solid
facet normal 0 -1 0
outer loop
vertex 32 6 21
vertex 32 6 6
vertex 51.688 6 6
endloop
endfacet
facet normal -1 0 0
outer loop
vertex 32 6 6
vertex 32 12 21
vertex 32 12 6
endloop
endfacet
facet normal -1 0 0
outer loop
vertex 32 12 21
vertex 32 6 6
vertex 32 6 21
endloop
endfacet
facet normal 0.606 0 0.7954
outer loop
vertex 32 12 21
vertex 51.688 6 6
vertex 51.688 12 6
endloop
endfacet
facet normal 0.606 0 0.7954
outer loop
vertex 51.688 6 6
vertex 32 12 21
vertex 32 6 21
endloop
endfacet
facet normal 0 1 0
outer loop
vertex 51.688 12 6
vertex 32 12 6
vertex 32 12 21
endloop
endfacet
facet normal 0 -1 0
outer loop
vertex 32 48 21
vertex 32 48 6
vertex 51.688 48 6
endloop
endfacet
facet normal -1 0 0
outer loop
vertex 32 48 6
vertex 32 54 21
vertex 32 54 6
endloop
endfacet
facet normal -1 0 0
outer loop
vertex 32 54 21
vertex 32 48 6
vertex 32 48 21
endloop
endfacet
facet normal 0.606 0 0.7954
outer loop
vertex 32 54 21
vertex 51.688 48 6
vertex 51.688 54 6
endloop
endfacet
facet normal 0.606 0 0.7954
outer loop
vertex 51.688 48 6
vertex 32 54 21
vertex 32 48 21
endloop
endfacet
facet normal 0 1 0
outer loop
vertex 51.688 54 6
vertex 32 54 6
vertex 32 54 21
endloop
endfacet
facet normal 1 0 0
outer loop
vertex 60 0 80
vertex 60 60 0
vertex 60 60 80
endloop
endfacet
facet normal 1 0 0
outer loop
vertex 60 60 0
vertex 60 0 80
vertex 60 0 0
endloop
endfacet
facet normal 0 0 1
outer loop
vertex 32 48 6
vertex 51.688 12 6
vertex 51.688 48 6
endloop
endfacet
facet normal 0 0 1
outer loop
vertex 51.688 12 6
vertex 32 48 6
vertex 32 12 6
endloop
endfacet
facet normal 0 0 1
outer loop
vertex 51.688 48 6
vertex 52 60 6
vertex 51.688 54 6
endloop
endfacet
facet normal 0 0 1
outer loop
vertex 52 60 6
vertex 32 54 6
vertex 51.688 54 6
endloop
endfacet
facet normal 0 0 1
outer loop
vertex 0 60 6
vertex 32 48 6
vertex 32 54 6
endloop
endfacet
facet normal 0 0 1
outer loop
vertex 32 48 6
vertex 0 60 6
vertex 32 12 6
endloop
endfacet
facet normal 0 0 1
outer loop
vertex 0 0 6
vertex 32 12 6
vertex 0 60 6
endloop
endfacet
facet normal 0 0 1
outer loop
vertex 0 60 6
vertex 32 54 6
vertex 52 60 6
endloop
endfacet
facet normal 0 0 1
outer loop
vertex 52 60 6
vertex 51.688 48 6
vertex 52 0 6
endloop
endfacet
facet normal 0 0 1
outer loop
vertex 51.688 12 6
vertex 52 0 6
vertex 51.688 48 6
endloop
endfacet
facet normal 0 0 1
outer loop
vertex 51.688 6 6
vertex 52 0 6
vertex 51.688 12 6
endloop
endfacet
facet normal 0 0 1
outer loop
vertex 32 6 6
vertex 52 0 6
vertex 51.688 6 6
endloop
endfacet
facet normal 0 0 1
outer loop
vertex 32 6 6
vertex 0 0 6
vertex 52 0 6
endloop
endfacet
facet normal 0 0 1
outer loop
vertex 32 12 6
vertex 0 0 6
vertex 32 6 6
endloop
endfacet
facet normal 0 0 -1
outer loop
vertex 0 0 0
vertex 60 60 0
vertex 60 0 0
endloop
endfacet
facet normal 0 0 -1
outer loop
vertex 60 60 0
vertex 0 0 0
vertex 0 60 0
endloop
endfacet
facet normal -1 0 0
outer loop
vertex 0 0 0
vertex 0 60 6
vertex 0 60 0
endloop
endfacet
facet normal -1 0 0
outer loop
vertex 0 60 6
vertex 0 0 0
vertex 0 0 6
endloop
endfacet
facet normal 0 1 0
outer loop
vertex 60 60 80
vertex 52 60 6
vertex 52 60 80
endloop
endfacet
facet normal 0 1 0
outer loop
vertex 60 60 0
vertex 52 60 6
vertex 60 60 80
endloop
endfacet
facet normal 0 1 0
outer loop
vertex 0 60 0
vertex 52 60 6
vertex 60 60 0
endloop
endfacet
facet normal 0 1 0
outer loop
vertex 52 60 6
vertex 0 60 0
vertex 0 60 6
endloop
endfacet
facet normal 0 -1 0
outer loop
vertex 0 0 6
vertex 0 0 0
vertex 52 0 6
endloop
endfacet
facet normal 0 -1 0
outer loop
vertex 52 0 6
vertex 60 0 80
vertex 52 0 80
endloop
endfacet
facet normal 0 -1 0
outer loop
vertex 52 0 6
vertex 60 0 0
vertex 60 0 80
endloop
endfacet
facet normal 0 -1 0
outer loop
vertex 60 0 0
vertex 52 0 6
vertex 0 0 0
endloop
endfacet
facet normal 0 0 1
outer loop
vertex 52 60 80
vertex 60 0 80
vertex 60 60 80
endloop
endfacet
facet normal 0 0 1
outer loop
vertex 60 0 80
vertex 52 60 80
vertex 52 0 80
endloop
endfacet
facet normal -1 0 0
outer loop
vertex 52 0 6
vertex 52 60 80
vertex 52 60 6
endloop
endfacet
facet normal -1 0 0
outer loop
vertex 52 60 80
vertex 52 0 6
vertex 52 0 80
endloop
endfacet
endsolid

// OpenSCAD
$fn = 32;

// ----------------------------------------------------------------------
// Rib bracket: 2-gusset L bracket
// ----------------------------------------------------------------------

// --- parameters (mm) ---
base_l = 60;              // foot length, X
base_w = 60;              // foot width, Y
base_t = 6;               // foot thickness
plate_t = 8;              // upright plate thickness
plate_h = 80;             // overall height
gus_l = 20;               // gusset leg along the foot
gus_h = 16;               // gusset height
gus_t = 6;                // gusset thickness
gus_edge = 6;             // gusset margin from the foot edge
n_gus = 2;                // gusset count

gus_pitch = (base_w - 2 * gus_edge - gus_t) / (n_gus - 1);  // gusset pitch

union() {
  cube([base_l, base_w, base_t]);
  translate([base_l - plate_t, 0, base_t - 1])
    cube([plate_t, base_w, plate_h - base_t + 1]);
  for (i = [0 : n_gus - 1])
    translate([base_l - plate_t - gus_l, gus_edge + i * gus_pitch, base_t - 1])
      rotate([-90, 0, 0])
        linear_extrude(height = gus_t)
          polygon(points = [[0, 0], [gus_l + 1, 0], [0, -gus_h]]);
}
